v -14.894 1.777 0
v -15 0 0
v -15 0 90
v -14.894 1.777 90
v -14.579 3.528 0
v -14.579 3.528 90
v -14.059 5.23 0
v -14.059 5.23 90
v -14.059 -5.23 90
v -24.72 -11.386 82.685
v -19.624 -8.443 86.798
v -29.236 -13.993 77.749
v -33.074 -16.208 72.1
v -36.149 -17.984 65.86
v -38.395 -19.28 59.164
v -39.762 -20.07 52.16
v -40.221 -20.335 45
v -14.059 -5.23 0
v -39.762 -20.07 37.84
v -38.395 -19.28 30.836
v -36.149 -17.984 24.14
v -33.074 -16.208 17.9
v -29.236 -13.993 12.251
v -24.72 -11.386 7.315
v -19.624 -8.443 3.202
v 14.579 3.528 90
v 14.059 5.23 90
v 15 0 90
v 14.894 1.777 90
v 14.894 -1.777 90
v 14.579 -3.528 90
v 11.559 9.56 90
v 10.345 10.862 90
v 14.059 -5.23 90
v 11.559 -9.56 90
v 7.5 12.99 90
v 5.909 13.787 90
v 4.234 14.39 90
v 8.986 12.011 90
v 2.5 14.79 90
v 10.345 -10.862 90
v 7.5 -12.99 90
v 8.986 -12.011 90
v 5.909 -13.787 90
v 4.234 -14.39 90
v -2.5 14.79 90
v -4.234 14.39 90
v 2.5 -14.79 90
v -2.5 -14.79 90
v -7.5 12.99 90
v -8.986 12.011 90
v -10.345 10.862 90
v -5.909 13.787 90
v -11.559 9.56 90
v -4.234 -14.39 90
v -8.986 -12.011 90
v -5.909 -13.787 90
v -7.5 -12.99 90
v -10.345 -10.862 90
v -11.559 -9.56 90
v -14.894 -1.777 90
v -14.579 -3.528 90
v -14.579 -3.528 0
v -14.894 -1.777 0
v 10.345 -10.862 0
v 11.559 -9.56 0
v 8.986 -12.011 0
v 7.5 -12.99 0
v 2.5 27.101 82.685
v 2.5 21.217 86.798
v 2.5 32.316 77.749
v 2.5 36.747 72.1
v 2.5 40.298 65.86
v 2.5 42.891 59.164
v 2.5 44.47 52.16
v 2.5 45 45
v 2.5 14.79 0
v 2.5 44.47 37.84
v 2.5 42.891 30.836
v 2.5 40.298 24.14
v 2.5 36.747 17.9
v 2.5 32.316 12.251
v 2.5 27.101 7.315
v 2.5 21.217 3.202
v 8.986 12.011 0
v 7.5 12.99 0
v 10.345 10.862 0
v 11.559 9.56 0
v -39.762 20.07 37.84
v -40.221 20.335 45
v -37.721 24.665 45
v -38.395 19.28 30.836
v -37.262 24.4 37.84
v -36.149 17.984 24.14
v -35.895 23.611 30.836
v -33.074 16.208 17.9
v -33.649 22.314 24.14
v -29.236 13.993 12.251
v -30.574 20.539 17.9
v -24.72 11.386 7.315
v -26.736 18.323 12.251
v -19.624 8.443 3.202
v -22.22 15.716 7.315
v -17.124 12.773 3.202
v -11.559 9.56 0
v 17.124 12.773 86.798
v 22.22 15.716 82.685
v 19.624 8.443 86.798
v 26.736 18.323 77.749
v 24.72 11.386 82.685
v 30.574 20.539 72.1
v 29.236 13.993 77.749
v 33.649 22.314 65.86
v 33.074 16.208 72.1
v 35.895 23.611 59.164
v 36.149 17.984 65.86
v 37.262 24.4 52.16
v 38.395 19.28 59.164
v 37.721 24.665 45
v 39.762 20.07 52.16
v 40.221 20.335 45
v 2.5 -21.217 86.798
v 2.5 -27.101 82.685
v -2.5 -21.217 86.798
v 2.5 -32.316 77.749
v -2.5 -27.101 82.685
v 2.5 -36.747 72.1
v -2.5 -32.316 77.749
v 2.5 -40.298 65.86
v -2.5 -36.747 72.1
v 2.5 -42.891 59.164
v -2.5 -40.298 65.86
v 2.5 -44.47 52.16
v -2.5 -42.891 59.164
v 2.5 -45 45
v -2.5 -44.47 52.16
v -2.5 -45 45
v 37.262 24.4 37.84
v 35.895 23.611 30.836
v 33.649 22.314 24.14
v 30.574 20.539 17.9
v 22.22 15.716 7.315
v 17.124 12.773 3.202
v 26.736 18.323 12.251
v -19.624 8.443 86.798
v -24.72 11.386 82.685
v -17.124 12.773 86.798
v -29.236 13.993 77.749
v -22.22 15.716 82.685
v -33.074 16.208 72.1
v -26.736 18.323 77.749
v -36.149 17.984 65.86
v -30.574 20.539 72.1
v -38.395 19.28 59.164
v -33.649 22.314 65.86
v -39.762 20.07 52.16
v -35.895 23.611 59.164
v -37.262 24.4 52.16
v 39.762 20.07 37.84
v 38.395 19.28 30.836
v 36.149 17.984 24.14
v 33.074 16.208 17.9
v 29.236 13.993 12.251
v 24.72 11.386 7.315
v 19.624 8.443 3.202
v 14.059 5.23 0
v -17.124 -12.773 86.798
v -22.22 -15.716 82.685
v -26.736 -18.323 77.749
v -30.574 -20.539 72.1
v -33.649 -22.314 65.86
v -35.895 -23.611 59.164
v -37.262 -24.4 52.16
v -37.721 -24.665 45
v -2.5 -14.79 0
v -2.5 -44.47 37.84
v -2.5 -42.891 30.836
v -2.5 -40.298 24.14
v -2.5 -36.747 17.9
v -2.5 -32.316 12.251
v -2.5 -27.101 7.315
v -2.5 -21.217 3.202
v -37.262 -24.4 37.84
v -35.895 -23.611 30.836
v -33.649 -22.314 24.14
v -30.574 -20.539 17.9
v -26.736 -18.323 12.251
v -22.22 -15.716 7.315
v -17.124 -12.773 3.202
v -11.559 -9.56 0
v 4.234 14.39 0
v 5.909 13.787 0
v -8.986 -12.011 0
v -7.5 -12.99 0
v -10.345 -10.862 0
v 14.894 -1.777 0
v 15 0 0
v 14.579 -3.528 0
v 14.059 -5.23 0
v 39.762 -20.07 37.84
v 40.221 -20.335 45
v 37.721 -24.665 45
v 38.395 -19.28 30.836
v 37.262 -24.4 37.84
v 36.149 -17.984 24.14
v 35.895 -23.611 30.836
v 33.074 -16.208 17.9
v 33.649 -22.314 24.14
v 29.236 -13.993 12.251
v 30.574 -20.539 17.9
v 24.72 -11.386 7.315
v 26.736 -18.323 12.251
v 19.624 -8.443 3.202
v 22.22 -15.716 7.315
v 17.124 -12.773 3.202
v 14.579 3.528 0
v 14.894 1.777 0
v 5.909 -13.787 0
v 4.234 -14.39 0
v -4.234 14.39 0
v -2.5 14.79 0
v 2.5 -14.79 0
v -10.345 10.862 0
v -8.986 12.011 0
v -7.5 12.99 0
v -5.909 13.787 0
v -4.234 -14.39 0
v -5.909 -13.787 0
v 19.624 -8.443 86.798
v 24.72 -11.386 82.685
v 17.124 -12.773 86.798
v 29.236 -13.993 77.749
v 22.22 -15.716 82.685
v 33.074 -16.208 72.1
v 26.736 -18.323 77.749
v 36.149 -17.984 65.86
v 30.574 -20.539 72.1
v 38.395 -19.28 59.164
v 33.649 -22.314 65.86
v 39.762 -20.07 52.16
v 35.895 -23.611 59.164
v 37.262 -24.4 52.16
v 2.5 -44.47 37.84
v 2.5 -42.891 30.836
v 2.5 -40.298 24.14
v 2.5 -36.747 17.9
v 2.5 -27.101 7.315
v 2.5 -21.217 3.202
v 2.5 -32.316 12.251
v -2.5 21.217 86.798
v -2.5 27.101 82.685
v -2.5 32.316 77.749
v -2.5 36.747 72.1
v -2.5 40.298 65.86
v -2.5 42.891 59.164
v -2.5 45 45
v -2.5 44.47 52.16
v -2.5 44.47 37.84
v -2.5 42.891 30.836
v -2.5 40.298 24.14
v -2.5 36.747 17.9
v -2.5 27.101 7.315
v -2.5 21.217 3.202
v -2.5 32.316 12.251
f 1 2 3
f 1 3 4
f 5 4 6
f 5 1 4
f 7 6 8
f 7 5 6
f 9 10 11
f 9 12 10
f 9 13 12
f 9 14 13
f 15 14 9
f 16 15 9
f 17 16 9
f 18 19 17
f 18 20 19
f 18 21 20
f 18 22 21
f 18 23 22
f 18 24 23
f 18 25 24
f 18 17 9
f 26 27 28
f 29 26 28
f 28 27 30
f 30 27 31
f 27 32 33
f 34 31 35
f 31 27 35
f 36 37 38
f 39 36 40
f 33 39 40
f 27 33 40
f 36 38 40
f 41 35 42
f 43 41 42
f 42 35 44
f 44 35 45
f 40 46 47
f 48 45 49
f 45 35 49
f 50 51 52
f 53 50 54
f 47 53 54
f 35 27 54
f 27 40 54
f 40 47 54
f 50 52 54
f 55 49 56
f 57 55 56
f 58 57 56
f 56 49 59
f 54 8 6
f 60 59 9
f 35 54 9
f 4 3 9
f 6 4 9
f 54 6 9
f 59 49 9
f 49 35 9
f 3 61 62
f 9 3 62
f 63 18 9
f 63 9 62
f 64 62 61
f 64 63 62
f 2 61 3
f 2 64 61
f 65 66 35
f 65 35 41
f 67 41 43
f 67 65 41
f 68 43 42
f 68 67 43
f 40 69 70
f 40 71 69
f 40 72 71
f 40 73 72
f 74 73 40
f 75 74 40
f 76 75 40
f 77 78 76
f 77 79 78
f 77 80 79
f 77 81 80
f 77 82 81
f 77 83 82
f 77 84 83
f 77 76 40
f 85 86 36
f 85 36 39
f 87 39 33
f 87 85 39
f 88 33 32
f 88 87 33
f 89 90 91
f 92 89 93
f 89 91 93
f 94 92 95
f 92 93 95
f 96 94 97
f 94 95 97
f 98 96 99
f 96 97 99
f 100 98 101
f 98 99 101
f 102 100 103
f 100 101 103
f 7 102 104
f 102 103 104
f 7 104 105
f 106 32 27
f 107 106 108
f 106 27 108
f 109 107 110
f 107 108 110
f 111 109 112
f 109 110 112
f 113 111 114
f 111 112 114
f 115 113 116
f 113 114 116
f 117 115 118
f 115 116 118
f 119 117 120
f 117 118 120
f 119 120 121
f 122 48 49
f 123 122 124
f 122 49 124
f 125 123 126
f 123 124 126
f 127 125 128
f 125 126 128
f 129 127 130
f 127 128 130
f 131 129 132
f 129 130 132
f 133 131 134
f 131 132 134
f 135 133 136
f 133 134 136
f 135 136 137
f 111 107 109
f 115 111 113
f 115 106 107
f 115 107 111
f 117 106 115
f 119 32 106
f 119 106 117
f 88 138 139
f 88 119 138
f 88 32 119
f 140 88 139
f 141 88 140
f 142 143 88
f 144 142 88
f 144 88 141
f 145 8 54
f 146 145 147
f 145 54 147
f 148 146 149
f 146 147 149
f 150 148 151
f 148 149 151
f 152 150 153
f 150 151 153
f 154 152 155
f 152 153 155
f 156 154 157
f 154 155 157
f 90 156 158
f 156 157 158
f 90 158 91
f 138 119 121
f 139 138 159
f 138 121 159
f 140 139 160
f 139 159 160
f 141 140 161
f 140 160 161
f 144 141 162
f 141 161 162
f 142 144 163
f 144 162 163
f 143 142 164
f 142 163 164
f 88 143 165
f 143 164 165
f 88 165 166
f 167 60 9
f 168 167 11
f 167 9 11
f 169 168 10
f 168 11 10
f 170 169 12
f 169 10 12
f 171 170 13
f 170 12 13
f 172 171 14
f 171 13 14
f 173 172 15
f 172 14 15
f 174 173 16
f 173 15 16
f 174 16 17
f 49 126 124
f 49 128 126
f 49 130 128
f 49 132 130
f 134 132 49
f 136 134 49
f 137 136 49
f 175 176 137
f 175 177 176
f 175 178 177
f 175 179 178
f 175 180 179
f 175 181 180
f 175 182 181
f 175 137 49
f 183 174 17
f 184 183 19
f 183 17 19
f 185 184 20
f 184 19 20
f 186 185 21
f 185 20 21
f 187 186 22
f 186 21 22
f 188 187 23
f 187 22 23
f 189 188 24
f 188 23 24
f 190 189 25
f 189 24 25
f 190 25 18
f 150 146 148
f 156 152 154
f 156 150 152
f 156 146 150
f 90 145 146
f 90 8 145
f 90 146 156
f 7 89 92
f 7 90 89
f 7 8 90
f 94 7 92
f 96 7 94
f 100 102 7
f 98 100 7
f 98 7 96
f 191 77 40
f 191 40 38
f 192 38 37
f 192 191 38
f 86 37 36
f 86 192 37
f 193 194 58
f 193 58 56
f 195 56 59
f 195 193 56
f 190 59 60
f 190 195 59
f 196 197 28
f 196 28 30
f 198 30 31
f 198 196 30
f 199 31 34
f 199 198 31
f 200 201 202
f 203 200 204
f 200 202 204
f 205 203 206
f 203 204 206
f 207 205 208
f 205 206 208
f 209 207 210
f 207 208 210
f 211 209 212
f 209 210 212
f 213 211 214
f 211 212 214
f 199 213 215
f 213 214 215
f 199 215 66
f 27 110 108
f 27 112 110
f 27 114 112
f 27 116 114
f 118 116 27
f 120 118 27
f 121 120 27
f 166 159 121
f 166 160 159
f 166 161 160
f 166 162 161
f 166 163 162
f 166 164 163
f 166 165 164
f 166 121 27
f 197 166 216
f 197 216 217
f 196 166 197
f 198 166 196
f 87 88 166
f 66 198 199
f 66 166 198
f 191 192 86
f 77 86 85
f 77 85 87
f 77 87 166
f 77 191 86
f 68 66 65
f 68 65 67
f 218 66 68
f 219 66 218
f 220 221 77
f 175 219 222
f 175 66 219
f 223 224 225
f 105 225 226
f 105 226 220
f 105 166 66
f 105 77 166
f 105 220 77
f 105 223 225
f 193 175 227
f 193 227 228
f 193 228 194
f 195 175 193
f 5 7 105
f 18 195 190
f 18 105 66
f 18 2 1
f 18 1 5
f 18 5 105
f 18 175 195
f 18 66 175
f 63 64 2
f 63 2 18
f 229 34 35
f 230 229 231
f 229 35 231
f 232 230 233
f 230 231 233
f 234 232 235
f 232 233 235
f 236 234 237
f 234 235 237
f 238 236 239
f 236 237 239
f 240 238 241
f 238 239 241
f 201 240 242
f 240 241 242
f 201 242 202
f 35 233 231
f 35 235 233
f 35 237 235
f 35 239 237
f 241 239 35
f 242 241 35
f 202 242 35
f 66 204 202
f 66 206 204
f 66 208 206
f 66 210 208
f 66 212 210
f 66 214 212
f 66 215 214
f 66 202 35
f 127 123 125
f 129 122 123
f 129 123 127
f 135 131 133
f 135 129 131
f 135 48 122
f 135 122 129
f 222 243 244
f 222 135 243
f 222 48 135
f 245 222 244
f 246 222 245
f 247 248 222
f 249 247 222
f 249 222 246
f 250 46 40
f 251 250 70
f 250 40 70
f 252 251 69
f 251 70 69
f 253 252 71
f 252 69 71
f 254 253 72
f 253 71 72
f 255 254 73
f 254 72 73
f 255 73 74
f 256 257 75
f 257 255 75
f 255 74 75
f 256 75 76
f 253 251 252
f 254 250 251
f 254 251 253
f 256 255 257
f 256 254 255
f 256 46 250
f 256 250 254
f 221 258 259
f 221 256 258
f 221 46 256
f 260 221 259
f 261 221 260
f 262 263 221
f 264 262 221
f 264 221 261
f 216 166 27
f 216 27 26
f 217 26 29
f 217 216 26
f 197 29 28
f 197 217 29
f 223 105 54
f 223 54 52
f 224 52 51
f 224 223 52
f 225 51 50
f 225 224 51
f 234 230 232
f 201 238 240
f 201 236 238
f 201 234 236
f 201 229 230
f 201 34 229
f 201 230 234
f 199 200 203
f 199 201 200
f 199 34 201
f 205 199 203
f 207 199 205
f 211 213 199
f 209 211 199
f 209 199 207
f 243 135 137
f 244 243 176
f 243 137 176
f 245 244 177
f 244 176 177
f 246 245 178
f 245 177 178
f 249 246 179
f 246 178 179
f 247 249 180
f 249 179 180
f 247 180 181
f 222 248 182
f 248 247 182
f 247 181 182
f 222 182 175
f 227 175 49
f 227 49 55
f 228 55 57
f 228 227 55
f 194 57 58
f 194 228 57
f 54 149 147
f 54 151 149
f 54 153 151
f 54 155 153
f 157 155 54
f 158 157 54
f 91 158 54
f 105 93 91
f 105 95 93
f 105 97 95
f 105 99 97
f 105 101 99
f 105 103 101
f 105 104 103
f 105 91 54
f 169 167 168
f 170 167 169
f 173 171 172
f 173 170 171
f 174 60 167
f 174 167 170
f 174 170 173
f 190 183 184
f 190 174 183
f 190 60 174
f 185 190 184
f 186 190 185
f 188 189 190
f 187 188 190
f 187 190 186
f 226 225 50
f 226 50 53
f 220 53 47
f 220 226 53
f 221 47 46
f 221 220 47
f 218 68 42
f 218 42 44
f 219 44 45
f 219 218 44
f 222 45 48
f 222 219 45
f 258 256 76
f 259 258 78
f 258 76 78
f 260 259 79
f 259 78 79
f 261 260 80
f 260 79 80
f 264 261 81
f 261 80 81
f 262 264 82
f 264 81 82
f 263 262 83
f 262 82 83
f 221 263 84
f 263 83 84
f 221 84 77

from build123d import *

# Parameters (mm, degrees)
BOSS_EXTRUDE1_DEPTH = 90
CUT_EXTRUDE2_DEPTH  = 100
CIRPATTERN3_COUNT   = 6


with BuildPart() as part:
    # Sketch1 → Boss-Extrude1 (new body)
    with BuildSketch(Plane.XY):
        with BuildLine():
            Line((-14.058688457, 5.230036219), (-40.22114317, 20.334936491))
            Line((-40.22114317, 20.334936491), (-37.72114317, 24.665063509))
            Line((-37.72114317, 24.665063509), (-11.558688457, 9.560163238))
            ThreePointArc((-11.558688457, 9.560163238), (-9.682458366, 11.456439237), (-7.5, 12.990381057))
            Line((-7.5, 12.990381057), (0, 0))
            Line((0, 0), (-15, 0))
            ThreePointArc((-15, 0), (-14.762796599, 2.657035297), (-14.058688457, 5.230036219))
        make_face()
    boss_extrude1 = extrude(amount=BOSS_EXTRUDE1_DEPTH)

    # Sketch2 → Cut-Extrude2 (cut)
    with BuildSketch(Plane(origin=(1.25, 2.165063509, 0), x_dir=(0.8660254037844417, -0.4999999999999949, 0), z_dir=(0.4999999999999949, 0.8660254037844417, 0))):
        with BuildLine():
            Line((-45, 0), (-45, -45))
            ThreePointArc((-45, -45), (-36.747126088, -17.900036675), (-14.790199458, 0))
            Line((-14.790199458, 0), (-45, 0))
        make_face()
        with BuildLine():
            Line((-45, -90), (-14.790199458, -90))
            ThreePointArc((-14.790199458, -90), (-36.747126088, -72.099963325), (-45, -45))
            Line((-45, -45), (-45, -90))
        make_face()
    cut_extrude2 = extrude(amount=-CUT_EXTRUDE2_DEPTH, mode=Mode.SUBTRACT)

    # CirPattern3: Boss-Extrude1, Cut-Extrude2 ×6 about axis
    cirpattern3_axis = Axis((0, 0, 90), (0, 0, -1))
    add([boss_extrude1.rotate(cirpattern3_axis, i * 360 / CIRPATTERN3_COUNT) for i in range(1, CIRPATTERN3_COUNT)])
    add([cut_extrude2.rotate(cirpattern3_axis, i * 360 / CIRPATTERN3_COUNT) for i in range(1, CIRPATTERN3_COUNT)], mode=Mode.SUBTRACT)


solid = part.part
